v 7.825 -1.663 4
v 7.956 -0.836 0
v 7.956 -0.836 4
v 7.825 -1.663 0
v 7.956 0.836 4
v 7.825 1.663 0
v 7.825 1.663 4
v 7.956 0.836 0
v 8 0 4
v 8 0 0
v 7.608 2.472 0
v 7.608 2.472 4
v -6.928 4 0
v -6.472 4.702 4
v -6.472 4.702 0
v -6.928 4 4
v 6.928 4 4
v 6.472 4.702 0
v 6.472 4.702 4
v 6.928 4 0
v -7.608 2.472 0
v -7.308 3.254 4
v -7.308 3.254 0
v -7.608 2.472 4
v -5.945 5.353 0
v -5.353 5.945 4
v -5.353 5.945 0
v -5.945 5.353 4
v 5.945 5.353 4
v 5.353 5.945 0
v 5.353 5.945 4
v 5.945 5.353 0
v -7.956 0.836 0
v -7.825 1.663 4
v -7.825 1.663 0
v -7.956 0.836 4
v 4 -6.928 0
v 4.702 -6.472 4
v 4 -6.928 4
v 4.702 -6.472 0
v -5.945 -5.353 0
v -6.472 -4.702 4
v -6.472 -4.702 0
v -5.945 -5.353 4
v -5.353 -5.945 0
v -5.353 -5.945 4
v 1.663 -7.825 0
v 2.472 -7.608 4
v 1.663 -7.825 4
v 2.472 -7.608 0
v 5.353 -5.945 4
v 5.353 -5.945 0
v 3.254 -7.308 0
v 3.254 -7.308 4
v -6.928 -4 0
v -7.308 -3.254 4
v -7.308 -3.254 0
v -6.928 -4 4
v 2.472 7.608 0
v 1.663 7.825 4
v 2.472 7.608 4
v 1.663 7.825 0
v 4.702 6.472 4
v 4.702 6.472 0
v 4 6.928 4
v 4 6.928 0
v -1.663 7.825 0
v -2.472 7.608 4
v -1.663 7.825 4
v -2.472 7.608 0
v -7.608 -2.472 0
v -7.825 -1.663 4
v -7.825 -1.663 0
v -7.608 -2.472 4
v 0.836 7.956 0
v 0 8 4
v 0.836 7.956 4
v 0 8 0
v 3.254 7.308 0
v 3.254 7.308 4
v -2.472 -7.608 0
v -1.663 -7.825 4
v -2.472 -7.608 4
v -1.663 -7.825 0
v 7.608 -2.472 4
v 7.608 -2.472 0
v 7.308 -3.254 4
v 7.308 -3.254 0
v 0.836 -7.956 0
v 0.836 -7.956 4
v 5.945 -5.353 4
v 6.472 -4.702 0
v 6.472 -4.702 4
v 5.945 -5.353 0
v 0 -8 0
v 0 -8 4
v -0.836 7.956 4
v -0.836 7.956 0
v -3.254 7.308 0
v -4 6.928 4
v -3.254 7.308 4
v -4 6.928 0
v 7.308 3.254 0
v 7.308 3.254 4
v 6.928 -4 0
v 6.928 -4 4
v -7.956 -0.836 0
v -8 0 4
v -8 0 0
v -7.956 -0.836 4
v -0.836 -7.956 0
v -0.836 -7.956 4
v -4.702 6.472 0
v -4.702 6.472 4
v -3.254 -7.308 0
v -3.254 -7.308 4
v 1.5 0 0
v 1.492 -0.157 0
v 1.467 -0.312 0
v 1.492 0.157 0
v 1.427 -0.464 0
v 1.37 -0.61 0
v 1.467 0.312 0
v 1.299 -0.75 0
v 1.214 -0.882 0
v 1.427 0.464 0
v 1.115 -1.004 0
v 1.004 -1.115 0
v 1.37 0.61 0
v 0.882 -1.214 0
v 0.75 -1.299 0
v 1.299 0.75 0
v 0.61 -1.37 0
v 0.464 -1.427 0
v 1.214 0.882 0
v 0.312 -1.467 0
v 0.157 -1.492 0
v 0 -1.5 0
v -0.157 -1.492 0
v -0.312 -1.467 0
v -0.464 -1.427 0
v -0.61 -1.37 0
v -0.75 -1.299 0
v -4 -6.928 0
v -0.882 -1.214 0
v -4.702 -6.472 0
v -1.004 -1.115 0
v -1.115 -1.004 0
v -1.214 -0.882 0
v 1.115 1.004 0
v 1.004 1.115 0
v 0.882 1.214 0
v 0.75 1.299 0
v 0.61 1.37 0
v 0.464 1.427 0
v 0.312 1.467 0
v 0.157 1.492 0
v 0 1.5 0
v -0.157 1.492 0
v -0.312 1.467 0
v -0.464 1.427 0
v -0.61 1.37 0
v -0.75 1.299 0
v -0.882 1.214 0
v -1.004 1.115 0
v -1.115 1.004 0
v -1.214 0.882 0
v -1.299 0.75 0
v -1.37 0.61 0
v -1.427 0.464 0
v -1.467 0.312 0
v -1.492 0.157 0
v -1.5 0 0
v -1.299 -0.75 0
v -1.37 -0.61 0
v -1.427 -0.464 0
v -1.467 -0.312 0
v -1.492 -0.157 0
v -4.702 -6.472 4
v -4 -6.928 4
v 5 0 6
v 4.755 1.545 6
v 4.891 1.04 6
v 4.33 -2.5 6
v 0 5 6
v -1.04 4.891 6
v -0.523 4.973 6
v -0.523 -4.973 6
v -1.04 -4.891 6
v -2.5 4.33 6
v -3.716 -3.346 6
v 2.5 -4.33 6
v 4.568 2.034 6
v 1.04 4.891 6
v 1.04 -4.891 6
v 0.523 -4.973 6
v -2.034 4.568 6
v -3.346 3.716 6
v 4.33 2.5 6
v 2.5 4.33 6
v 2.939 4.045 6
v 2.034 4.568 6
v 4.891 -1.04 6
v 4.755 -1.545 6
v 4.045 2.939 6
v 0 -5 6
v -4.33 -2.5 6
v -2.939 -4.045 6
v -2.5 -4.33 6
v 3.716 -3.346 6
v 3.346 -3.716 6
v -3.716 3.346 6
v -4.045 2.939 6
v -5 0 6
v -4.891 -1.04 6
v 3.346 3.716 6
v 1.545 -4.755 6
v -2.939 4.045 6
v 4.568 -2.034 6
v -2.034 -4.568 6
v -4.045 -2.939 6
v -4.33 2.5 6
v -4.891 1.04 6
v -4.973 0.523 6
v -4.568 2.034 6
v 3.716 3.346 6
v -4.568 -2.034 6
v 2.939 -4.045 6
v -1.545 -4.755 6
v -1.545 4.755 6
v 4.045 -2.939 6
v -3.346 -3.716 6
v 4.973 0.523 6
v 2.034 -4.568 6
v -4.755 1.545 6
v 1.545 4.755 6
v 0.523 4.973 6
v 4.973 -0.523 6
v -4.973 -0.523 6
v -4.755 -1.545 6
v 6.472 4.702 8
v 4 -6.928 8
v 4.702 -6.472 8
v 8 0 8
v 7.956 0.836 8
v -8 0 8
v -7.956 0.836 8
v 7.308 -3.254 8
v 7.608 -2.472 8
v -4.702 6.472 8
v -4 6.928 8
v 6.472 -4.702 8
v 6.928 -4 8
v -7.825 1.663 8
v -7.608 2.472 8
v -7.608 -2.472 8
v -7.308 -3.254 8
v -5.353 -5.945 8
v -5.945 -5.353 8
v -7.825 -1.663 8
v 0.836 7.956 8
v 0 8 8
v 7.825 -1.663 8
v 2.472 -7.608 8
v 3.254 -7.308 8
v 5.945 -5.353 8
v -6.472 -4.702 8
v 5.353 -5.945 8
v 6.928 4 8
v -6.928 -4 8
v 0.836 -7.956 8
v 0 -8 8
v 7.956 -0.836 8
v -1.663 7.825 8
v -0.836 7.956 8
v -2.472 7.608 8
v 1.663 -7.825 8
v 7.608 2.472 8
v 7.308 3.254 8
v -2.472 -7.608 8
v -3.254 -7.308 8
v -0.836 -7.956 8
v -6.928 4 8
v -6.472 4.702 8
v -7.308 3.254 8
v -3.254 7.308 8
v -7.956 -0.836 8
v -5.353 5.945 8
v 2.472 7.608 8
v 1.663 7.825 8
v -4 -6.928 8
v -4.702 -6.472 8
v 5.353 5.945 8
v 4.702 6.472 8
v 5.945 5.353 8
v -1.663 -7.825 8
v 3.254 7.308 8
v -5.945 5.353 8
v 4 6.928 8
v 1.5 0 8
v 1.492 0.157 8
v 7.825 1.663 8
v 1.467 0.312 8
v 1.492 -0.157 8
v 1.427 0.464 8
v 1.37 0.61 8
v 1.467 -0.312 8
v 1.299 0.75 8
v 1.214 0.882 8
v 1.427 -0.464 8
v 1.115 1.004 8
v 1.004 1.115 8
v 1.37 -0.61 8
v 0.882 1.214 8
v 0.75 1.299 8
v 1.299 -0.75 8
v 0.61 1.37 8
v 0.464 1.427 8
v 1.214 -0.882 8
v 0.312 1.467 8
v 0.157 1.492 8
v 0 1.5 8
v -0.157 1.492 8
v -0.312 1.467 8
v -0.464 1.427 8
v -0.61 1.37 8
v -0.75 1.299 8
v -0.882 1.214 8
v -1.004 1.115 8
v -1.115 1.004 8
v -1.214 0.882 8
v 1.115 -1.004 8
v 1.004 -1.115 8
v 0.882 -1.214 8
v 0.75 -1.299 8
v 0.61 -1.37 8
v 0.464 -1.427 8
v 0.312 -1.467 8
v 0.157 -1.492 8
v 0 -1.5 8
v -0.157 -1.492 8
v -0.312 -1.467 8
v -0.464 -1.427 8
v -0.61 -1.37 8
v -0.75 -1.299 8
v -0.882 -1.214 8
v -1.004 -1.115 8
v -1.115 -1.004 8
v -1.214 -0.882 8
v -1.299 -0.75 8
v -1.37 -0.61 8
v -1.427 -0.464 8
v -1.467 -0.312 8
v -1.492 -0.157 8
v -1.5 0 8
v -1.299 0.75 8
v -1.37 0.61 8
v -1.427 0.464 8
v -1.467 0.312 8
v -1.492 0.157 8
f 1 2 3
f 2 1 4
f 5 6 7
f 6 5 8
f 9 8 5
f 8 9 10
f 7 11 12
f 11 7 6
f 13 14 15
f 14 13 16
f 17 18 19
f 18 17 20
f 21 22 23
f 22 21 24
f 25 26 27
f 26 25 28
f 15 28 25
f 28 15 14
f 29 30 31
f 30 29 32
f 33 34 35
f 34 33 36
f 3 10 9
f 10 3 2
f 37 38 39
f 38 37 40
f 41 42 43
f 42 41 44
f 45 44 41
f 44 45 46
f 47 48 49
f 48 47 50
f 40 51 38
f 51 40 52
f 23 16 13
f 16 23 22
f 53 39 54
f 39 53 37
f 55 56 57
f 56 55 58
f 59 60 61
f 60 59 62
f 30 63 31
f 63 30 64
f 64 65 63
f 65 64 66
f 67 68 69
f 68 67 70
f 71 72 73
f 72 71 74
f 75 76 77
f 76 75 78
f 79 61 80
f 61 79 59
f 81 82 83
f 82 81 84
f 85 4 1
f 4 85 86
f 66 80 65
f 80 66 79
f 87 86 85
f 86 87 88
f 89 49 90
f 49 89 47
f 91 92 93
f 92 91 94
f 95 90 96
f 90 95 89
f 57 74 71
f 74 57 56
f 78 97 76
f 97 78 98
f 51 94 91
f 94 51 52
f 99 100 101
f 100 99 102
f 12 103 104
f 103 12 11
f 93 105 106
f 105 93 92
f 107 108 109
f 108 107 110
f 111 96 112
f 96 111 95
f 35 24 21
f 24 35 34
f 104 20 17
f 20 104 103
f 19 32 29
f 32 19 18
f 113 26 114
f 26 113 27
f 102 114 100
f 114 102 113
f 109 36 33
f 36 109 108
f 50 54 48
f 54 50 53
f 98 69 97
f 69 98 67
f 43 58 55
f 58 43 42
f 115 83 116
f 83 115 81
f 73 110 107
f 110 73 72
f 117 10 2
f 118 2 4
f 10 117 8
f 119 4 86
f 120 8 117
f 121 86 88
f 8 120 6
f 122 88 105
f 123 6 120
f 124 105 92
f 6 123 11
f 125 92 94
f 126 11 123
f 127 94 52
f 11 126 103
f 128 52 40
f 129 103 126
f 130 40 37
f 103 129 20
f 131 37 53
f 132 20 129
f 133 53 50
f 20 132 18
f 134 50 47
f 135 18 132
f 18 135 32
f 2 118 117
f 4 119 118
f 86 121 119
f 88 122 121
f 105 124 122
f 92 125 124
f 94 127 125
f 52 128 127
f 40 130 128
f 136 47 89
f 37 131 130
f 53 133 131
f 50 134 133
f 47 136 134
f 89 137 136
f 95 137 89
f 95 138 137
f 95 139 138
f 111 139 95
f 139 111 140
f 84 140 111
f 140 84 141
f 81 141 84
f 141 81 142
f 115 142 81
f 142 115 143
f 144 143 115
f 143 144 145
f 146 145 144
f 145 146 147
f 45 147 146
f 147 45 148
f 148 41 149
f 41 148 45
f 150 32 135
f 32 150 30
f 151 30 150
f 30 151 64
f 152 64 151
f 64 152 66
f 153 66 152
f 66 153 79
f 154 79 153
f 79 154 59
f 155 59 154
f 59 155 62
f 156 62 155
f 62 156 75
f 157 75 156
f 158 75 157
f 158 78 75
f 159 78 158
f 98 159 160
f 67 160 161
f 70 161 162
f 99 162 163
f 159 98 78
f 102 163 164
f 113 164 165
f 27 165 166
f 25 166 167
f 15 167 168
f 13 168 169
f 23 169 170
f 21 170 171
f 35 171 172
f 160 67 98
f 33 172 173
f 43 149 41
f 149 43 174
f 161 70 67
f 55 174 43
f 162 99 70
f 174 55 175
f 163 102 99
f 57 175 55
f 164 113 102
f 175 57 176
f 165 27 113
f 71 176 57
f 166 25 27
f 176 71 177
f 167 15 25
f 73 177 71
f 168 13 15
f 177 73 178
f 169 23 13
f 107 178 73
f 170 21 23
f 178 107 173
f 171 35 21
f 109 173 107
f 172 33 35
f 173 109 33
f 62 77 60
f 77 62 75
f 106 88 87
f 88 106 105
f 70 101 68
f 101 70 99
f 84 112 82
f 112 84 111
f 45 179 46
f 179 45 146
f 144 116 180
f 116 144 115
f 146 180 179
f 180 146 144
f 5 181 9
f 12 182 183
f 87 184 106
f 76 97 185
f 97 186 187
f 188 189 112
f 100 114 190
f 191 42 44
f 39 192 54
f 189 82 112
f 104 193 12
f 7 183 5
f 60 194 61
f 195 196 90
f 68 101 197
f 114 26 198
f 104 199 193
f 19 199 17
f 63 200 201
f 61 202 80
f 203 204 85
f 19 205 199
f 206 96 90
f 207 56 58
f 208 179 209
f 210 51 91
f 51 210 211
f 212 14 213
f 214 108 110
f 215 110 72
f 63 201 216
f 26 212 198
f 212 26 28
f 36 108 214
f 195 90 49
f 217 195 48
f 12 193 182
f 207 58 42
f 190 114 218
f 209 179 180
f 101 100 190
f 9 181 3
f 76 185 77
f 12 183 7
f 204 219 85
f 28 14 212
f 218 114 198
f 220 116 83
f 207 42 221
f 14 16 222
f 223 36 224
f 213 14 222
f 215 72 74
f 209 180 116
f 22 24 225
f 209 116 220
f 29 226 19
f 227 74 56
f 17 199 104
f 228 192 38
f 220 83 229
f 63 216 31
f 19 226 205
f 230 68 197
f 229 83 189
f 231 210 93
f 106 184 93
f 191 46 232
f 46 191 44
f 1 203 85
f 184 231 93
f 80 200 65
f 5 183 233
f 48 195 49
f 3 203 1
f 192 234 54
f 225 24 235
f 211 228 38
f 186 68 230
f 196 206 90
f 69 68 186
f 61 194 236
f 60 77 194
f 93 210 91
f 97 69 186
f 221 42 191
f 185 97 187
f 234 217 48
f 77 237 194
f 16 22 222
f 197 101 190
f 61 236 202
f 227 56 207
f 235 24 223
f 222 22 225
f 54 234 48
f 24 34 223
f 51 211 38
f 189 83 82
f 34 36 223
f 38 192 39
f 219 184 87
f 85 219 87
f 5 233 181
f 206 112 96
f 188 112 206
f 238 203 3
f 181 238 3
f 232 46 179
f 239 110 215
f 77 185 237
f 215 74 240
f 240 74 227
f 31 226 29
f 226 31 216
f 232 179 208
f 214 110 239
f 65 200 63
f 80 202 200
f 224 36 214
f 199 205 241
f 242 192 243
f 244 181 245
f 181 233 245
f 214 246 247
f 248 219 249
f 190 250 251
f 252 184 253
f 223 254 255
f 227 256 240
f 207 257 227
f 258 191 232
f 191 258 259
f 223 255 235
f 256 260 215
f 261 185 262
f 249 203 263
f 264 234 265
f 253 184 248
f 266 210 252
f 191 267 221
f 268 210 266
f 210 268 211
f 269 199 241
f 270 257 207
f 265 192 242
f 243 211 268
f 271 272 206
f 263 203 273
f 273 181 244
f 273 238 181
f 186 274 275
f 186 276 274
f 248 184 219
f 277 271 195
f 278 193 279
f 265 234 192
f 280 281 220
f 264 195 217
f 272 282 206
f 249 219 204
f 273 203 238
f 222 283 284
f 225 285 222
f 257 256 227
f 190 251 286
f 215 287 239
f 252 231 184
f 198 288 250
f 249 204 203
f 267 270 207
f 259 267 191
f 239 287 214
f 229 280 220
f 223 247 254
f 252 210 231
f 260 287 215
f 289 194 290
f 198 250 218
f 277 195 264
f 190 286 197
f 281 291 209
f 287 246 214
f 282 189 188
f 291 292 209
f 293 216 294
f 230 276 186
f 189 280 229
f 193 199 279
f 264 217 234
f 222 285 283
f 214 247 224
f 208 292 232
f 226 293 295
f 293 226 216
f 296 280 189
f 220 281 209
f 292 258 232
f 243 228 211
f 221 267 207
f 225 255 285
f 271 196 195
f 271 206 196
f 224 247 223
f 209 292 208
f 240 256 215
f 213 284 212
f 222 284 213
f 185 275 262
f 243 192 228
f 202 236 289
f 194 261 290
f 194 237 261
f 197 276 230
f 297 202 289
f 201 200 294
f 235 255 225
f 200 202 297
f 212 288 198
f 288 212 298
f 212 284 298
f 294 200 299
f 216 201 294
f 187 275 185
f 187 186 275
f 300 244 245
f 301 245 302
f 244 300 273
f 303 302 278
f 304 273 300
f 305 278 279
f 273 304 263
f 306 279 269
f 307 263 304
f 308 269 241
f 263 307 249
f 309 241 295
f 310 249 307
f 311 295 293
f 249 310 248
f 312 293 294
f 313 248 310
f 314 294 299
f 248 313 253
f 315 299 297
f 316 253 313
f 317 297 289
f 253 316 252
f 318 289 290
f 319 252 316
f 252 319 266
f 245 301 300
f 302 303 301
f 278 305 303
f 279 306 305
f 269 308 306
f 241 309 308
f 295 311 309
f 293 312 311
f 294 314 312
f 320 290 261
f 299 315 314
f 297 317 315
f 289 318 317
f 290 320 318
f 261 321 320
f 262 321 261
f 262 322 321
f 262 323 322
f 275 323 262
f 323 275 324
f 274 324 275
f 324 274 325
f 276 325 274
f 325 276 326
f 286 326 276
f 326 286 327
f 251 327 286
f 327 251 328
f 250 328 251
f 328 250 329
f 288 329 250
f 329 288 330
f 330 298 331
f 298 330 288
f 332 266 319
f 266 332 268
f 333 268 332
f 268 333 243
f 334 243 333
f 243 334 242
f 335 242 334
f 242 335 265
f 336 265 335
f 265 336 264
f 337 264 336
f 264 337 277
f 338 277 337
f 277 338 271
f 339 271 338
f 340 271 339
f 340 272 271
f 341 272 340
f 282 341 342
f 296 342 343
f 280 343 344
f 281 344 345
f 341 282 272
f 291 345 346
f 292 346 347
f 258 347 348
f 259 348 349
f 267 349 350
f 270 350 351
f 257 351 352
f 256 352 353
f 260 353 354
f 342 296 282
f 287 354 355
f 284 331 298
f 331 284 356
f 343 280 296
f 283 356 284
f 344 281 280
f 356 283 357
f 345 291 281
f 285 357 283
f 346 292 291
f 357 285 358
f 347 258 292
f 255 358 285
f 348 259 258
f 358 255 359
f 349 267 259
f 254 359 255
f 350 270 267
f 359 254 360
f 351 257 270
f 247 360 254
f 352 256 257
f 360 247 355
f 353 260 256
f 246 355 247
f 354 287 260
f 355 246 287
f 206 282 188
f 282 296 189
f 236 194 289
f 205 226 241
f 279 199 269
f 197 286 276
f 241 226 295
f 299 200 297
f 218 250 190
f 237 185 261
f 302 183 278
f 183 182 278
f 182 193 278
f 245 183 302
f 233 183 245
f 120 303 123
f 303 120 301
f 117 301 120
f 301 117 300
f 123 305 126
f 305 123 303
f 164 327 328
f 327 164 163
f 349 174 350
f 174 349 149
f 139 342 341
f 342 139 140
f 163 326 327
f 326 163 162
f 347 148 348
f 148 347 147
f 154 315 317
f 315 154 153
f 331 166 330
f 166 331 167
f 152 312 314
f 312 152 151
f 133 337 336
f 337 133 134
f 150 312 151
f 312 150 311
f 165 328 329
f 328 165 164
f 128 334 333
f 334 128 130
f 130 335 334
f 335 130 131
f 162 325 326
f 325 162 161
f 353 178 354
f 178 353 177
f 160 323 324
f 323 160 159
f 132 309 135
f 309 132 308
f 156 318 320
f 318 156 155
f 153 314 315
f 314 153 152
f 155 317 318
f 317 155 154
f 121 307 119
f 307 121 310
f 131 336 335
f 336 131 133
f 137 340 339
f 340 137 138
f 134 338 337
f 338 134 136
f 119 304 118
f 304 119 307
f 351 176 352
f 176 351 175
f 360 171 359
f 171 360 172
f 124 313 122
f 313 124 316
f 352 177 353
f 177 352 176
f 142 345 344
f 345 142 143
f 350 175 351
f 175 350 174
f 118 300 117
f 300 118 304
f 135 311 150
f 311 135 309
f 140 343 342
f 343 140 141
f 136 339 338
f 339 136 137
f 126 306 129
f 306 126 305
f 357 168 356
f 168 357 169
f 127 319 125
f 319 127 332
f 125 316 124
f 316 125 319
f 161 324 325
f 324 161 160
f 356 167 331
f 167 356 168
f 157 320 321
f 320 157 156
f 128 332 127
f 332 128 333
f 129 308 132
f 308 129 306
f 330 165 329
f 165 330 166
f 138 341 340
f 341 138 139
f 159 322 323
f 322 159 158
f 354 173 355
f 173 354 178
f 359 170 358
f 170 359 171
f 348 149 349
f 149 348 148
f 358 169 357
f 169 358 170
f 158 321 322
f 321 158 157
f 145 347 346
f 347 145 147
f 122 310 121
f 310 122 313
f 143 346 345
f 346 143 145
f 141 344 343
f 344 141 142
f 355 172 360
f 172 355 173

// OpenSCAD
// V-groove guide wheel.
$fn = 60;
eps = 0.02;
bore_d = 3;
outer_d = 16;
width = 8;
groove_d = outer_d-6;
difference() {
    union() { cylinder(d=outer_d,h=width/2); translate([0,0,width/2]) cylinder(d1=outer_d,d2=groove_d,h=width/4); translate([0,0,3*width/4]) cylinder(d1=groove_d,d2=outer_d,h=width/4); }
    translate([0,0,-eps]) cylinder(d=bore_d,h=width+2*eps);
}
